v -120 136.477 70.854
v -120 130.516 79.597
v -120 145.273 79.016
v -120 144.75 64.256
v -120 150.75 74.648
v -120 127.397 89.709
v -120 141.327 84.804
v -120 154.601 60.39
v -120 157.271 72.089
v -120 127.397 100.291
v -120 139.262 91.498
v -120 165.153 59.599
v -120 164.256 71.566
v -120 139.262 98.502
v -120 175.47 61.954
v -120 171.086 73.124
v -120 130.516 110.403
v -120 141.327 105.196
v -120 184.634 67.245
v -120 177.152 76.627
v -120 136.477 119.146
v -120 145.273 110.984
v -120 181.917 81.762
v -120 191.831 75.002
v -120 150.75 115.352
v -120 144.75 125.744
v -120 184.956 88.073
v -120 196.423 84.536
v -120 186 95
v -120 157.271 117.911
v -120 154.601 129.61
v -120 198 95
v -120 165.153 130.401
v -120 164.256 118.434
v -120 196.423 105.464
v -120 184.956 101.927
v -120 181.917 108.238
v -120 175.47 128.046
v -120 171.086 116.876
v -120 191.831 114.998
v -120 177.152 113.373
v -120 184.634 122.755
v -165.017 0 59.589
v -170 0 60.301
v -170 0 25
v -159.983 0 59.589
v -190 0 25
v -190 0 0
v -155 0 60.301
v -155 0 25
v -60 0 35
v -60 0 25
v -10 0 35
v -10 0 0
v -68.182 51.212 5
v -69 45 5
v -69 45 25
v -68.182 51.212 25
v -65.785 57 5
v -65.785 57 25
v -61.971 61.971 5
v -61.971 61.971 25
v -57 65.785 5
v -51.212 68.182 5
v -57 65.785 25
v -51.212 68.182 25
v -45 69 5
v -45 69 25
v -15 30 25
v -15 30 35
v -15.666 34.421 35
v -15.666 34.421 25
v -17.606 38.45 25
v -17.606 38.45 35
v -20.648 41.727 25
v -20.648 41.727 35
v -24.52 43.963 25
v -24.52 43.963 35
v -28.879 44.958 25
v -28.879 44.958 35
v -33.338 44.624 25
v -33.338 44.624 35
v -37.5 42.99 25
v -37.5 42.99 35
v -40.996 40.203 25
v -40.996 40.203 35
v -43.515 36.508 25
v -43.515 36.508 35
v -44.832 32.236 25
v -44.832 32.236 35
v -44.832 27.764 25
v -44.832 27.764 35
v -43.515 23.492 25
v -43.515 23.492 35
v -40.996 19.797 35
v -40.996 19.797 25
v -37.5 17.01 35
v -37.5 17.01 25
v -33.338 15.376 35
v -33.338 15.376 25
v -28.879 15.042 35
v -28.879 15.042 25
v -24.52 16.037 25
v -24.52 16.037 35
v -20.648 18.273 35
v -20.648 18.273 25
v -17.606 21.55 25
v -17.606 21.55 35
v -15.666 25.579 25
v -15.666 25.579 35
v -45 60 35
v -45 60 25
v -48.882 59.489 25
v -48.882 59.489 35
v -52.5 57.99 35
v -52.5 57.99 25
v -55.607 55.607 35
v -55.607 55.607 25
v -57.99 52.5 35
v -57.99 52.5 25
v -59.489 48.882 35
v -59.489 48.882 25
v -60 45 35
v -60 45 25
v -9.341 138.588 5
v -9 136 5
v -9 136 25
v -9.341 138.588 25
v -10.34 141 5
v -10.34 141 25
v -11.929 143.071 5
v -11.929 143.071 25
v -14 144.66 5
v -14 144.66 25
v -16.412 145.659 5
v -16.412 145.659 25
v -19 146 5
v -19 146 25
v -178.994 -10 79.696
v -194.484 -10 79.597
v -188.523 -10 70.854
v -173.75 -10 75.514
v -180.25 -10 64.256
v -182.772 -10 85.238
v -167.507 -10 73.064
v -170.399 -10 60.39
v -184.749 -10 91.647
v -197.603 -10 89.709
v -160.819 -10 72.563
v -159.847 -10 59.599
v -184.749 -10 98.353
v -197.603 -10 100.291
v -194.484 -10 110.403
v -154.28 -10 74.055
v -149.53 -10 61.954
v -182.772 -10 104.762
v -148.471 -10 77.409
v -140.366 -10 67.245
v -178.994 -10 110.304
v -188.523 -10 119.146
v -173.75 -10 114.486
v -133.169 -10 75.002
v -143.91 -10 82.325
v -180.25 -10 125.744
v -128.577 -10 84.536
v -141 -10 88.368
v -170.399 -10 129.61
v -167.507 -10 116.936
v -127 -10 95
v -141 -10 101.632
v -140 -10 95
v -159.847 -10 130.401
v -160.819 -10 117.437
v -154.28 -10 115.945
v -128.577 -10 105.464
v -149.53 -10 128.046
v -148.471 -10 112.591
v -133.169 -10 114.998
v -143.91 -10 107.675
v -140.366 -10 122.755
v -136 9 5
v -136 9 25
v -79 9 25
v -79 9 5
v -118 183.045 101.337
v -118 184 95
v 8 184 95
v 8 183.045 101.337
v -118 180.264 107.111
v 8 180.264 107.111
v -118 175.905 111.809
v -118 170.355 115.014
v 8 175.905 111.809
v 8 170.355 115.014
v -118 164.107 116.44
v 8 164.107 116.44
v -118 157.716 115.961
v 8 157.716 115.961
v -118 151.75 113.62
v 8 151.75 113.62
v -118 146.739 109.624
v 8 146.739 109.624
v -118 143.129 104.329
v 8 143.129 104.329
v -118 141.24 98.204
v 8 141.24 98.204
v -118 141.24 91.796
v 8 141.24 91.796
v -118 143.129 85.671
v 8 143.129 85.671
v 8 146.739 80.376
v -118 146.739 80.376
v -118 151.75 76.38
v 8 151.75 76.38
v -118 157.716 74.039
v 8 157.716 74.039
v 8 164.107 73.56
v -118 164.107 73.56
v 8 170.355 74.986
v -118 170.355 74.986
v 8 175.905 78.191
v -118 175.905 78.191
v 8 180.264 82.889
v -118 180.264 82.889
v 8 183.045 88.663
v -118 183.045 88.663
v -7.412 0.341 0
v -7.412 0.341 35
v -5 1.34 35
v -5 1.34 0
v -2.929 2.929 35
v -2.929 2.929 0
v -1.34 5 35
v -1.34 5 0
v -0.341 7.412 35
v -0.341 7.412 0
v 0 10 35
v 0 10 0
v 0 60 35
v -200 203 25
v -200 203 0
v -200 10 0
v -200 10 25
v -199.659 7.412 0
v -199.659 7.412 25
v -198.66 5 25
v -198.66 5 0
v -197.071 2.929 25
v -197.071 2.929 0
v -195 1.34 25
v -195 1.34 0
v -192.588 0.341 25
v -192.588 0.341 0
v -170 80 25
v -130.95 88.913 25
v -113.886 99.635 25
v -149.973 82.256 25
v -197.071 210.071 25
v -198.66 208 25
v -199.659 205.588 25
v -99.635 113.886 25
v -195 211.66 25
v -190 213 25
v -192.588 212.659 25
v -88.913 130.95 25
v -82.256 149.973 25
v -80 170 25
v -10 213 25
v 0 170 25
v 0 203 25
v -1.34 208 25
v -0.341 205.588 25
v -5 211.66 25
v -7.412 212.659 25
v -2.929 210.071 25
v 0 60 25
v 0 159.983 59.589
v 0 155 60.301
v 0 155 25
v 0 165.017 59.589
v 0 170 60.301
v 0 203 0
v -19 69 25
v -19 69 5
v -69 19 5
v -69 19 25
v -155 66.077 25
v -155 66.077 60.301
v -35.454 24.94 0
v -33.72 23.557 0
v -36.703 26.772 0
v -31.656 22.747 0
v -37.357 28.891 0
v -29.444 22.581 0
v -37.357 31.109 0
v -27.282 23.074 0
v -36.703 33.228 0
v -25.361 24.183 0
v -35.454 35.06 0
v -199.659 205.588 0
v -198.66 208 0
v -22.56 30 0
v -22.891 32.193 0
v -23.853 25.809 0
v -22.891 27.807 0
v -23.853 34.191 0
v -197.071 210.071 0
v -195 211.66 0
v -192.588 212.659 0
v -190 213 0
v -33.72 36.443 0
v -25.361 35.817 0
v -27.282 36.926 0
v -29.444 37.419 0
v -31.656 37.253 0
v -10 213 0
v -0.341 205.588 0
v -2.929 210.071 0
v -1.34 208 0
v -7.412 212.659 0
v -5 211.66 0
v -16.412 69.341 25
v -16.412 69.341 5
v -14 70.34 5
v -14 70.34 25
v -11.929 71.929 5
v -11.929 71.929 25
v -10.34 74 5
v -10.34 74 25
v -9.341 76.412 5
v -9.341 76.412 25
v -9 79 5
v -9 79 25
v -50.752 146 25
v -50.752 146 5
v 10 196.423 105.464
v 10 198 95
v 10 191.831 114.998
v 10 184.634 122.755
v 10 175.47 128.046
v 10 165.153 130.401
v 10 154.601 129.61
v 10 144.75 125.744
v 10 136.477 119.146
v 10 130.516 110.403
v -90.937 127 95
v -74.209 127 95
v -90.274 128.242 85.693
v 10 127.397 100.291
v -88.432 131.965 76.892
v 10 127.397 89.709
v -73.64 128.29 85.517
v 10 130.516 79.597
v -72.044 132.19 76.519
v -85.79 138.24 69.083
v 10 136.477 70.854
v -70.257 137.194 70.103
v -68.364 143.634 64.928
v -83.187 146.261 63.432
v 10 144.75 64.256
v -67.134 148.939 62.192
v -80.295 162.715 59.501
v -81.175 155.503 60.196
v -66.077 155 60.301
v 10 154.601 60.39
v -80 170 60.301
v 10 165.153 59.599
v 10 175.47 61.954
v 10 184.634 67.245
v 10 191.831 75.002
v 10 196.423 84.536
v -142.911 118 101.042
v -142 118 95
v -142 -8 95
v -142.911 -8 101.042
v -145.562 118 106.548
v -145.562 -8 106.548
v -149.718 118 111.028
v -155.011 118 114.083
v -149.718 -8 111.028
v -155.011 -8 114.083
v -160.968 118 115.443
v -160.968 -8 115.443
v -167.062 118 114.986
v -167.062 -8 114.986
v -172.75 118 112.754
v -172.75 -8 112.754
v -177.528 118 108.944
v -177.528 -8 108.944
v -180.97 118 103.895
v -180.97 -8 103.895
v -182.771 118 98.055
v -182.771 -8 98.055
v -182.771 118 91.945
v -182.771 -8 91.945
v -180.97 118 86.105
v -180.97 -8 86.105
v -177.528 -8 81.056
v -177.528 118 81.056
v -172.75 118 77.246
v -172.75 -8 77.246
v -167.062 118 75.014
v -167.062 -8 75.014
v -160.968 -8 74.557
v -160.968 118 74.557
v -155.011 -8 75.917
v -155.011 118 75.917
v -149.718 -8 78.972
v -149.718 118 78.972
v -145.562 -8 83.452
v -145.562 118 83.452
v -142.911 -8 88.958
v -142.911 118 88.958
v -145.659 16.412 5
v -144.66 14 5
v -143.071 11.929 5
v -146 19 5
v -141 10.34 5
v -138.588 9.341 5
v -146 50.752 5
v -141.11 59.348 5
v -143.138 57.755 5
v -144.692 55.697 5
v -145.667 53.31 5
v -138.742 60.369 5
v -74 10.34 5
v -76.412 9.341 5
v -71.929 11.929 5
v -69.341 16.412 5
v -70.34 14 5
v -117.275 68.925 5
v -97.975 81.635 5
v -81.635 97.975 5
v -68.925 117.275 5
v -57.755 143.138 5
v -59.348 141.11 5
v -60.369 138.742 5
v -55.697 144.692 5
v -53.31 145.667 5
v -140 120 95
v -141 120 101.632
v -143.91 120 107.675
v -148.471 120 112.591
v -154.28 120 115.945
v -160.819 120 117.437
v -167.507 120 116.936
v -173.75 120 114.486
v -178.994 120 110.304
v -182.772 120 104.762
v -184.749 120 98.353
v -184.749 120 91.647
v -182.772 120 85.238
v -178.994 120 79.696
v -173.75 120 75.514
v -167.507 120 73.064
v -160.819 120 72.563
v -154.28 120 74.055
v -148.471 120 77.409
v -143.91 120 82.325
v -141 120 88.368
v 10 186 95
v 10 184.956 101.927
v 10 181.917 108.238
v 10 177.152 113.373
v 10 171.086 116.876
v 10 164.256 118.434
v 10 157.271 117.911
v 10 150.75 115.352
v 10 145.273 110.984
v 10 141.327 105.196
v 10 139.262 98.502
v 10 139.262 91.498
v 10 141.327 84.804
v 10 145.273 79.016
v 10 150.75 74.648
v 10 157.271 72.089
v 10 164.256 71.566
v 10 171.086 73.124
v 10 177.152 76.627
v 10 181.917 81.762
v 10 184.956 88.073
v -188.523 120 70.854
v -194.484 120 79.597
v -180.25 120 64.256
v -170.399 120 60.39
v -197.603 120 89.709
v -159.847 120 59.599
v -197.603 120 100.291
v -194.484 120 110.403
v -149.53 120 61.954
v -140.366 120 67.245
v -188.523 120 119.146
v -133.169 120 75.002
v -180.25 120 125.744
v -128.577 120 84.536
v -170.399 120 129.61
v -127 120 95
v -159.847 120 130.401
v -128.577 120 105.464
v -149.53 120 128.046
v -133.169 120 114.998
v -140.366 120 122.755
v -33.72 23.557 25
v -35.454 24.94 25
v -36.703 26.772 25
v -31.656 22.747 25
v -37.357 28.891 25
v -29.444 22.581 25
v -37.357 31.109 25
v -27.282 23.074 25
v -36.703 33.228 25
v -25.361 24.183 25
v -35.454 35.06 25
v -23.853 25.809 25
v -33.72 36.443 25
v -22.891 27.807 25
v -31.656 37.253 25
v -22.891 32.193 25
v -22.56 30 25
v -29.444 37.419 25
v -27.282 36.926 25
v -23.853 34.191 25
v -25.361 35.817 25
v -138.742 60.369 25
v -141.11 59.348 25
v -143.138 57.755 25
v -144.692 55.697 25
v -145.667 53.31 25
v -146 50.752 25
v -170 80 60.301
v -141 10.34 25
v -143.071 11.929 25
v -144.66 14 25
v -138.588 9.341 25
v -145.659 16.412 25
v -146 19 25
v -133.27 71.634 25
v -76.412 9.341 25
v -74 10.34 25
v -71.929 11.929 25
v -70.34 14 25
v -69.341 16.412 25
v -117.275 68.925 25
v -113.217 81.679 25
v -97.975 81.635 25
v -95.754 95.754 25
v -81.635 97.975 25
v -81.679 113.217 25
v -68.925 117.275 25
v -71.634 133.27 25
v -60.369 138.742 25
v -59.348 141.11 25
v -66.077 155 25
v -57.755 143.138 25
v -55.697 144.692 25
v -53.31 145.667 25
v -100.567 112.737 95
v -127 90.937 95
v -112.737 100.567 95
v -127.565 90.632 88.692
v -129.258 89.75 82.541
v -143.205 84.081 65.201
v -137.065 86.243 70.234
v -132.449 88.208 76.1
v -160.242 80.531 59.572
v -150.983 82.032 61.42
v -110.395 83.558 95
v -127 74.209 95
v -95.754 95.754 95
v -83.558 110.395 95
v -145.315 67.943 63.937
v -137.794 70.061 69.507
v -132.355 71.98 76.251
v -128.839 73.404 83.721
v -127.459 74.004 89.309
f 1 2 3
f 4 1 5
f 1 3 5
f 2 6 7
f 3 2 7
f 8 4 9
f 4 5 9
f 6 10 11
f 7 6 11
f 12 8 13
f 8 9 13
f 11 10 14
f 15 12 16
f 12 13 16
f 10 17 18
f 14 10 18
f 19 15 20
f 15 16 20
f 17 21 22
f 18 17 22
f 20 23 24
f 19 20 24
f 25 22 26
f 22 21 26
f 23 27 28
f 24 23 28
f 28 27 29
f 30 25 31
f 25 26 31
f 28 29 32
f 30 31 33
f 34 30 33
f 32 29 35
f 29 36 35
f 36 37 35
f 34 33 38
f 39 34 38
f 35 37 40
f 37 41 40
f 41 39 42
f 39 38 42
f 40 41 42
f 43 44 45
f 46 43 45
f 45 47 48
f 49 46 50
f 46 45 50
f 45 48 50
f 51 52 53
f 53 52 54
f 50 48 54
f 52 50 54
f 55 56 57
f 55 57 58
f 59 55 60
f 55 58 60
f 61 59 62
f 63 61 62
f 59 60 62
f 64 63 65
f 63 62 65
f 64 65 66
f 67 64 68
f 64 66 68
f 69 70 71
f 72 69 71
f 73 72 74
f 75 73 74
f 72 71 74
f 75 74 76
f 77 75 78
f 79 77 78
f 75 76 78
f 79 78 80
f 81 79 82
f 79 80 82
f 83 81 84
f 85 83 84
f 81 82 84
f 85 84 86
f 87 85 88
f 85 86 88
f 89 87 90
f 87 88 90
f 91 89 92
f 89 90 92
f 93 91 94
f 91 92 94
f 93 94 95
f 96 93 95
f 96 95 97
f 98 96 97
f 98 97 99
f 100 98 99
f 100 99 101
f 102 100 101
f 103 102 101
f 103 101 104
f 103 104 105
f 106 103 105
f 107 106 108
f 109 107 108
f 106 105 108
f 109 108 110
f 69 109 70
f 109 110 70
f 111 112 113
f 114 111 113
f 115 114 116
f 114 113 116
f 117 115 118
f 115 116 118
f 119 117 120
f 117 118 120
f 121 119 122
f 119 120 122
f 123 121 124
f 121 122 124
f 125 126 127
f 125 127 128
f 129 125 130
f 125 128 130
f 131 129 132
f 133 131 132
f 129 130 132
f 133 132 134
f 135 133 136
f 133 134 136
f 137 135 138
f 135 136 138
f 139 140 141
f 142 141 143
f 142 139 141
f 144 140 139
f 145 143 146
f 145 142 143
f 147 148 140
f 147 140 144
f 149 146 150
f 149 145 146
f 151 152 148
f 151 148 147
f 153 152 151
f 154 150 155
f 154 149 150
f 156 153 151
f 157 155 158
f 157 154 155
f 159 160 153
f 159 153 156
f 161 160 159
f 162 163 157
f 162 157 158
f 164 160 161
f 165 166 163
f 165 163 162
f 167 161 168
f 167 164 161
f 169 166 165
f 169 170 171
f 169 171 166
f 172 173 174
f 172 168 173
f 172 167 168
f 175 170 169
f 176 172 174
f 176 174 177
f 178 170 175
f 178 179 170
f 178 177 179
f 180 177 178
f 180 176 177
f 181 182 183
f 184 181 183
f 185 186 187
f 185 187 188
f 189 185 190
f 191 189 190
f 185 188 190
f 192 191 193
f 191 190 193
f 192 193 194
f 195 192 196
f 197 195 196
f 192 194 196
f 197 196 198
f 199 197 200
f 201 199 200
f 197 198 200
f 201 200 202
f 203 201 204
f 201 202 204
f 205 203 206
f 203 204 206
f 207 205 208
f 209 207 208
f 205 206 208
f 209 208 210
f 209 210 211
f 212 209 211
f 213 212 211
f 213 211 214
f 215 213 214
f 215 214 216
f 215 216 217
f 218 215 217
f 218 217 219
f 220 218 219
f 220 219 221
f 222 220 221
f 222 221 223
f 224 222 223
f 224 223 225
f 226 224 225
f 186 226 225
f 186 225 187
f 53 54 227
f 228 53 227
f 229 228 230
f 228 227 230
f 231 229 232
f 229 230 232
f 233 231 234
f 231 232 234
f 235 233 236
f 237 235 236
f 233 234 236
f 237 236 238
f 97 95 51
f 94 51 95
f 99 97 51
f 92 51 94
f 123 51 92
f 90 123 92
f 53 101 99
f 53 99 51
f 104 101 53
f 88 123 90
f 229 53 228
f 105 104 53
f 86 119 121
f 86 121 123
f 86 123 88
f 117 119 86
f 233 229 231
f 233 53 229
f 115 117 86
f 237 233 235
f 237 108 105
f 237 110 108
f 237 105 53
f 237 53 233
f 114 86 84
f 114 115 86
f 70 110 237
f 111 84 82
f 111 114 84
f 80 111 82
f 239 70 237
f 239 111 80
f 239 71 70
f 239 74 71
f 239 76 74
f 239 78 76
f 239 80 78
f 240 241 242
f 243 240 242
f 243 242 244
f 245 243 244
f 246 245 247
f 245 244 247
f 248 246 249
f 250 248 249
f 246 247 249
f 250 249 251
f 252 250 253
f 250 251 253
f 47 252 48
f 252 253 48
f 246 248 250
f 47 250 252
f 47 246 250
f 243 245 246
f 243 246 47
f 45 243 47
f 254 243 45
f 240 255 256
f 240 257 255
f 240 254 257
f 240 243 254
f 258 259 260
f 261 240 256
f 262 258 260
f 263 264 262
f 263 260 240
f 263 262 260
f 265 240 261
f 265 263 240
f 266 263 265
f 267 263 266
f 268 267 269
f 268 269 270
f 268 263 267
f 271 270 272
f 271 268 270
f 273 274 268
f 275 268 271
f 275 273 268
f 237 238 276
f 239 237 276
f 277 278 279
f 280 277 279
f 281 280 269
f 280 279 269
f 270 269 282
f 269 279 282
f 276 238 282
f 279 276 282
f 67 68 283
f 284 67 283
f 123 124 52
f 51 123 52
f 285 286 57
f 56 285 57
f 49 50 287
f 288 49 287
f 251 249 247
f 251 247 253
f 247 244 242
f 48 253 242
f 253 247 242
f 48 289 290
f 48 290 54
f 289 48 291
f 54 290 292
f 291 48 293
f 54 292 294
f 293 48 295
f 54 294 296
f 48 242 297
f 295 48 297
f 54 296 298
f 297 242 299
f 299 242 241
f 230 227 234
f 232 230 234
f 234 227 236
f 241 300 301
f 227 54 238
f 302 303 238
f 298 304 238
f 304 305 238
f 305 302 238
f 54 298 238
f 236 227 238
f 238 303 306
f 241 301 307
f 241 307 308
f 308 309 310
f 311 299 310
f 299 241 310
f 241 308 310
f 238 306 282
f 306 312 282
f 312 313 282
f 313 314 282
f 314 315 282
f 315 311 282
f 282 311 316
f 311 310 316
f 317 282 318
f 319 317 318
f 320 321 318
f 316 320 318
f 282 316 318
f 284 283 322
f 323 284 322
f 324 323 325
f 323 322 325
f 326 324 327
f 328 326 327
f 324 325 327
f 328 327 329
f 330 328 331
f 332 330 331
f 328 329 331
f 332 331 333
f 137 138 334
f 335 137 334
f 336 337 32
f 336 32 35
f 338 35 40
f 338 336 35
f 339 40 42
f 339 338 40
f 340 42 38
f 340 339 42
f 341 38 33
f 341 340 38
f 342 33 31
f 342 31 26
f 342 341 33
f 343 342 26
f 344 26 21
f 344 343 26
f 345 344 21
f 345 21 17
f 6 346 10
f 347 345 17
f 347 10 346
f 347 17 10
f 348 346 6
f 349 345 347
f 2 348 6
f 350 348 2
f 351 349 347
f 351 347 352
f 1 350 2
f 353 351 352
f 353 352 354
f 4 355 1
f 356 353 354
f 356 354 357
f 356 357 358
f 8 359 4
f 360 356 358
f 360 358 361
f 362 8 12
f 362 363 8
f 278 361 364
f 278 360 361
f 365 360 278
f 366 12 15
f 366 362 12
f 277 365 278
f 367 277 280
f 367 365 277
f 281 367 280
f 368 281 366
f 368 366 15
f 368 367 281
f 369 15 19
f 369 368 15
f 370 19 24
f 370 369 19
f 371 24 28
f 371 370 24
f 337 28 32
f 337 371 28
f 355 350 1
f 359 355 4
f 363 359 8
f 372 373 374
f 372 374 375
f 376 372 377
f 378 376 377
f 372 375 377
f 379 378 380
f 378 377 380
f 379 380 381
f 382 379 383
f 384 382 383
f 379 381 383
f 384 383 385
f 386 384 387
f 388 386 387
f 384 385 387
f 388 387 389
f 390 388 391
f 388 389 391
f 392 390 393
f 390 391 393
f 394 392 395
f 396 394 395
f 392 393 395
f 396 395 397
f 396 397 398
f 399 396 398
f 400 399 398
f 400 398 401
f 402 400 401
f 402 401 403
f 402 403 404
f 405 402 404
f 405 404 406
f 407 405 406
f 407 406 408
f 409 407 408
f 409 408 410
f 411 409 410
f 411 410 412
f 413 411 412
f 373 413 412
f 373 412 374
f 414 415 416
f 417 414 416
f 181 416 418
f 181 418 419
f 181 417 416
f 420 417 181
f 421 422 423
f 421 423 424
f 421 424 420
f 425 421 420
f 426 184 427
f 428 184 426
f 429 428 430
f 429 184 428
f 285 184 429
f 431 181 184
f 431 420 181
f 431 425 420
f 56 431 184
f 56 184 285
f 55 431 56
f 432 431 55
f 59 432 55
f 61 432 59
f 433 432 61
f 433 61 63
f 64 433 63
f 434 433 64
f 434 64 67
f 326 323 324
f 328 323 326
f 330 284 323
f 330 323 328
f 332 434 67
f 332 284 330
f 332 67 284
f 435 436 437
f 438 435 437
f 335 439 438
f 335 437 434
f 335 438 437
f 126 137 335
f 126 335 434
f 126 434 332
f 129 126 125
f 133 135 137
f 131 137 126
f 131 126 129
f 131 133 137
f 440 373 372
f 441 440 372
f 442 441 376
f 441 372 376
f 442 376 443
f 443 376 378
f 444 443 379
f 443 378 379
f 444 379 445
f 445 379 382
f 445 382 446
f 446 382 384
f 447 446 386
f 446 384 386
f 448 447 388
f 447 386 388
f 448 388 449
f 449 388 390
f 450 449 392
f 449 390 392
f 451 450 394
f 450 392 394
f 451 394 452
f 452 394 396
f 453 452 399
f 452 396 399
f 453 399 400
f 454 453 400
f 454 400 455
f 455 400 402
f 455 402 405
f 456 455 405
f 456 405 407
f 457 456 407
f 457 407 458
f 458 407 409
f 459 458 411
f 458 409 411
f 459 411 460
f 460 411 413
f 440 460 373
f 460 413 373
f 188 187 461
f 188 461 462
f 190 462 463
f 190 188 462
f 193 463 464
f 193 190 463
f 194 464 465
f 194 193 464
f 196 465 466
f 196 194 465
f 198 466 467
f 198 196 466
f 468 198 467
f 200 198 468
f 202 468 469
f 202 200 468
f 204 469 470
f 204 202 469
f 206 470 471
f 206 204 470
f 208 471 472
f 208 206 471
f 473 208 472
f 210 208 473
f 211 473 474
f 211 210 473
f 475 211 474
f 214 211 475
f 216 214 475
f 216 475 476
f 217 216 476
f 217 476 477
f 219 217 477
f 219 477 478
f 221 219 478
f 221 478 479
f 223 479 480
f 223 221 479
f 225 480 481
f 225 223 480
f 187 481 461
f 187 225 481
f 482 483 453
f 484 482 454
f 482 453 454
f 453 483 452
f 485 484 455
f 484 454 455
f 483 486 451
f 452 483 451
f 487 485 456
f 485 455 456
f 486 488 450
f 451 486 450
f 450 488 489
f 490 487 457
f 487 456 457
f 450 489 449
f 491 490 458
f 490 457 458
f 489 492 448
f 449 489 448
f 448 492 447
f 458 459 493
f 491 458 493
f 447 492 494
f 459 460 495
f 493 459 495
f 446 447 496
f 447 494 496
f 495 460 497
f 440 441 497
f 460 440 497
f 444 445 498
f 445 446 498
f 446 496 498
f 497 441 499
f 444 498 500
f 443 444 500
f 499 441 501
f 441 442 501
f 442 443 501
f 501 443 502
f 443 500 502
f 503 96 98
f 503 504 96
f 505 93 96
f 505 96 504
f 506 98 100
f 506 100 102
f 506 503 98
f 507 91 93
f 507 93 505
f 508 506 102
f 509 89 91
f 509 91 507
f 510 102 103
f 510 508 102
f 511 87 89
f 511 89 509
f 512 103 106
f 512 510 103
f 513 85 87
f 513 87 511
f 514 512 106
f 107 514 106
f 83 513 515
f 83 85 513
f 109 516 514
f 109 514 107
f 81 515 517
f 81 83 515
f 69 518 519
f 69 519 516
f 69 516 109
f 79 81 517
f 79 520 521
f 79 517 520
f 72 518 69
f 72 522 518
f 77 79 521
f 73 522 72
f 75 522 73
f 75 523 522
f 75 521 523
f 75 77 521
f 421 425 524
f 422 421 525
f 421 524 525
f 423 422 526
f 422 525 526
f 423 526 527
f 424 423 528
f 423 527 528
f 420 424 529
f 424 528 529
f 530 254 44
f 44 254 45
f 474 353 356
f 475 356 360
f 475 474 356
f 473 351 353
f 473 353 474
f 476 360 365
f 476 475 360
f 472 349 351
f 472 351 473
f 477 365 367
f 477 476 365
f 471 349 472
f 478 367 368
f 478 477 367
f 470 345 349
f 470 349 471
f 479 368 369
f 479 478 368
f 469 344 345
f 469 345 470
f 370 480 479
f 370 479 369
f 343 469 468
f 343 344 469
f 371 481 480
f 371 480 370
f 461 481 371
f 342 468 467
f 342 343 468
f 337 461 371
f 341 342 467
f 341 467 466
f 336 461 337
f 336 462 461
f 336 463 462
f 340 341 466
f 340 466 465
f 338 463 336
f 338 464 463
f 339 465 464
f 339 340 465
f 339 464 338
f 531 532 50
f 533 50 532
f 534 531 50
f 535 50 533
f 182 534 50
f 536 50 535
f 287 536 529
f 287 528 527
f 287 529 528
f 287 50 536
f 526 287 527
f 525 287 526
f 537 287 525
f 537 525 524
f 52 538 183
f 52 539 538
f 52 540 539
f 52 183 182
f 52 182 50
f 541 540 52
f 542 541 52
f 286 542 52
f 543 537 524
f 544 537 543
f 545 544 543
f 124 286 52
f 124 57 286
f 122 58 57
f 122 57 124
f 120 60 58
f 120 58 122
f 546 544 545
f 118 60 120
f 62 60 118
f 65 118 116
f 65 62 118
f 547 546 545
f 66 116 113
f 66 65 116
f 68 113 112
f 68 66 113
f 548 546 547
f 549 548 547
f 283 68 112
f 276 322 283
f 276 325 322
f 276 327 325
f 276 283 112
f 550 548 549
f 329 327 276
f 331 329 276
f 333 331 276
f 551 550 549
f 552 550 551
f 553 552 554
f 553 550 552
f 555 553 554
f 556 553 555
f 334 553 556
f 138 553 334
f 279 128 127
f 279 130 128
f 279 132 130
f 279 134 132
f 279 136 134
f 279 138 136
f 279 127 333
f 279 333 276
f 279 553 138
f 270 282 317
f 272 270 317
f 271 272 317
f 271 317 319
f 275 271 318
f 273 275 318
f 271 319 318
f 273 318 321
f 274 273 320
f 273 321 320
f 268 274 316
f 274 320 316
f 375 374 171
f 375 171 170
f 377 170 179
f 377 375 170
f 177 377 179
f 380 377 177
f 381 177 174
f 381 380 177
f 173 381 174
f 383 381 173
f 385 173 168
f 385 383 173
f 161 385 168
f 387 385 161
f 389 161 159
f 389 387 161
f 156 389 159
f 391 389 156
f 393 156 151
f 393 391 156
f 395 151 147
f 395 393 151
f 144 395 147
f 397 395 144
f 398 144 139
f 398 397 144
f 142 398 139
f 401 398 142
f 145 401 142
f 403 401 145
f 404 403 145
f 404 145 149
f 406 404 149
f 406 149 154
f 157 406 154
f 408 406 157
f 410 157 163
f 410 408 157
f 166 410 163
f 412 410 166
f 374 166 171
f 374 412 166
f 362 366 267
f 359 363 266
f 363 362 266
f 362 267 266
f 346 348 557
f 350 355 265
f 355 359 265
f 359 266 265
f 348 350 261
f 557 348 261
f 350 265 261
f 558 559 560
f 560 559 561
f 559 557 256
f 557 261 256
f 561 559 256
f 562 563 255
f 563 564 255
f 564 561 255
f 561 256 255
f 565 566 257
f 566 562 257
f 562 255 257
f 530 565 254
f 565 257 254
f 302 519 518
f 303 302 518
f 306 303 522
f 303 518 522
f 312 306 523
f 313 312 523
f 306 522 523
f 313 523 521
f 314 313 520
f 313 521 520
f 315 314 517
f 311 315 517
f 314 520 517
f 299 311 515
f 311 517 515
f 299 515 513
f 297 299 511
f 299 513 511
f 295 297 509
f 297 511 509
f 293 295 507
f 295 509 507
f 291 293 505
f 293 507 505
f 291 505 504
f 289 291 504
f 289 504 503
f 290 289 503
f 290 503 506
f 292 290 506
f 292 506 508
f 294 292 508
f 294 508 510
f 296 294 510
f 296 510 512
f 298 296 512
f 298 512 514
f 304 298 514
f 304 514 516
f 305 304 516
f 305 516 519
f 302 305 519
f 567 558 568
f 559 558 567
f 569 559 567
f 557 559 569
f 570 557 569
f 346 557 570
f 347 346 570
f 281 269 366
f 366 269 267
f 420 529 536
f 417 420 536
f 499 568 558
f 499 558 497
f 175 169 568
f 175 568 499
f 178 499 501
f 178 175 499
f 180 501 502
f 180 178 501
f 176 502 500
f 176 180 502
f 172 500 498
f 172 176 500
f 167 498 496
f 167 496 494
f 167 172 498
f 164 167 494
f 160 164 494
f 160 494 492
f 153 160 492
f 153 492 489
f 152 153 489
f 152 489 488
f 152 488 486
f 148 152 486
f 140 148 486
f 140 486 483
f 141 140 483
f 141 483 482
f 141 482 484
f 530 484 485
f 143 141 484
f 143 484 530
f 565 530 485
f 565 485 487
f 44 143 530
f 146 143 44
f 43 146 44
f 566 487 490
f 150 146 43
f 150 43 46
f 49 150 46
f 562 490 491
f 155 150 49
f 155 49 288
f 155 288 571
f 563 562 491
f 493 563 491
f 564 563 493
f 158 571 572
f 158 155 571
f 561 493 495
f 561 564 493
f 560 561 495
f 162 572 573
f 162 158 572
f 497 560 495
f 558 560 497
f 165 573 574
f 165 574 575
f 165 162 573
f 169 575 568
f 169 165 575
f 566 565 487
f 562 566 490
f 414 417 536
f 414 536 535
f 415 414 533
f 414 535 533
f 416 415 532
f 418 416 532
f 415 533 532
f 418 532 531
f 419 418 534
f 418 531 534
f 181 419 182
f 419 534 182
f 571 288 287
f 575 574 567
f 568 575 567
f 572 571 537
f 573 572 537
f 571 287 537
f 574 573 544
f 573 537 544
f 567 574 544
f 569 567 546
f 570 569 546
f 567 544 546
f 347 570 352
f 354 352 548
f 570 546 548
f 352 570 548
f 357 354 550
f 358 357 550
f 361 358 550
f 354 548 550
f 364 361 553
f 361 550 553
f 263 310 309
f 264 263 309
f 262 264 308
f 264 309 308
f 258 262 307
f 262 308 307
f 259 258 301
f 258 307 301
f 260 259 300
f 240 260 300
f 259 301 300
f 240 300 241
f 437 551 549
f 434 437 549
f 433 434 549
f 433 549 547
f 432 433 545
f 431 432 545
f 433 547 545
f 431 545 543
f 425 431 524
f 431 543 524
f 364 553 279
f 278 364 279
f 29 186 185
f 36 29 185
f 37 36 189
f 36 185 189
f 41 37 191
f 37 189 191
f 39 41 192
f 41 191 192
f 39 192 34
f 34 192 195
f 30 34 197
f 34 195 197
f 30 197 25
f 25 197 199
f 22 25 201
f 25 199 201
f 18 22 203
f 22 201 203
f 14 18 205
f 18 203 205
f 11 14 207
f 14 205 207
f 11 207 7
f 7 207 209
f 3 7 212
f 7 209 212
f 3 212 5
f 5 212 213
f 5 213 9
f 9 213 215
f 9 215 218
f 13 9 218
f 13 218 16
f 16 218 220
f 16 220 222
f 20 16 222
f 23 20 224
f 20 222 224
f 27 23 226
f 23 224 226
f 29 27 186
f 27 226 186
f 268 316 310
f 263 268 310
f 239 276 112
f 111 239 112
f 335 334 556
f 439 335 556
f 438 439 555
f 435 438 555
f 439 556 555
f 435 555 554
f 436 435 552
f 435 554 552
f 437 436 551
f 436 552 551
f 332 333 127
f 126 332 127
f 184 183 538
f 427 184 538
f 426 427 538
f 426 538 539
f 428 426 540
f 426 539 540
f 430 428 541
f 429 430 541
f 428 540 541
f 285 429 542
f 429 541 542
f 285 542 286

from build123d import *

# Parameters (mm, degrees)
F1_DEPTH  = 25
F3_DEPTH  = 70
F5_DEPTH  = 10
F6_R      = 15
F7_DEPTH  = 10
F8_R      = 7.44
F9_DEPTH  = 25.001
F11_DEPTH = 20
F13_R     = 35.5
F14_DEPTH = 130
F15_R     = 20.5
F16_DEPTH = 223.001
F18_R     = 35.5
F19_DEPTH = 130
F20_R     = 21.5
F21_DEPTH = 210.001
F22_SIZE2 = 2
F22_SIZE  = 2


with BuildPart() as f1:
    # F0 (on Top) → F1 (new body)
    with BuildSketch(Plane.XY):
        with BuildLine():
            Line((-190, 0), (-10, 0))
            ThreePointArc((-10, 0), (-2.9289321881, 2.9289321881), (0, 10))
            Line((0, 10), (0, 203))
            ThreePointArc((0, 203), (-2.9289321881, 210.0710678119), (-10, 213))
            Line((-10, 213), (-190, 213))
            ThreePointArc((-190, 213), (-197.0710678119, 210.0710678119), (-200, 203))
            Line((-200, 203), (-200, 10))
            ThreePointArc((-200, 10), (-197.0710678119, 2.9289321881), (-190, 0))
        make_face()
    extrude(amount=F1_DEPTH)

    # F2 (on face) → F3 (join)
    with BuildSketch(Plane.XY.offset(25)):
        with BuildLine():
            Line((0, 155), (0, 170))
            Line((0, 170), (-80, 170))
            ThreePointArc((-80, 170), (-106.3603896932, 106.3603896932), (-170, 80))
            Line((-170, 80), (-170, 0))
            Line((-170, 0), (-155, 0))
            Line((-155, 0), (-155, 66.0769515459))
            ThreePointArc((-155, 66.0769515459), (-95.7537879754, 95.7537879754), (-66.0769515459, 155))
            Line((-66.0769515459, 155), (0, 155))
        make_face()
    extrude(amount=F3_DEPTH)

    # F4 (on face) → F5 (join)
    with BuildSketch(Plane.XY.offset(25)):
        with BuildLine():
            Line((0, 60), (-45, 60))
            ThreePointArc((-45, 60), (-55.6066017178, 55.6066017178), (-60, 45))
            Line((-60, 45), (-60, 0))
            Line((-60, 0), (-10, 0))
            ThreePointArc((-10, 0), (-2.9289321881, 2.9289321881), (0, 10))
            Line((0, 10), (0, 60))
        make_face()
    extrude(amount=F5_DEPTH)

    # F6 (on face) → F7 (cut)
    with BuildSketch(Plane.XY.offset(35)):
        with Locations((-30, 30)):
            Circle(F6_R)
    extrude(amount=-F7_DEPTH, mode=Mode.SUBTRACT)

    # F8 (on face) → F9 (cut, through all)
    with BuildSketch(Plane.XY.offset(25)):
        with Locations((-30, 30)):
            Circle(F8_R)
    extrude(amount=-F9_DEPTH, mode=Mode.SUBTRACT)

    # F10 (on face) → F11 (cut)
    with BuildSketch(Plane.XY.offset(25)):
        with BuildLine():
            ThreePointArc((-19, 69), (-11.9289321881, 71.9289321881), (-9, 79))
            Line((-9, 79), (-9, 136))
            ThreePointArc((-9, 136), (-11.9289321881, 143.0710678119), (-19, 146))
            Line((-19, 146), (-50.7523585139, 146))
            ThreePointArc((-50.7523585139, 146), (-56.7765034807, 143.981834214), (-60.369103795, 138.7419354839))
            ThreePointArc((-60.369103795, 138.7419354839), (-89.3898269447, 89.3898269447), (-138.7419354839, 60.369103795))
            ThreePointArc((-138.7419354839, 60.369103795), (-143.981834214, 56.7765034807), (-146, 50.7523585139))
            Line((-146, 50.7523585139), (-146, 19))
            ThreePointArc((-146, 19), (-143.0710678119, 11.9289321881), (-136, 9))
            Line((-136, 9), (-79, 9))
            ThreePointArc((-79, 9), (-71.9289321881, 11.9289321881), (-69, 19))
            Line((-69, 19), (-69, 45))
            ThreePointArc((-69, 45), (-61.9705627485, 61.9705627485), (-45, 69))
            Line((-45, 69), (-19, 69))
        make_face()
    extrude(amount=-F11_DEPTH, mode=Mode.SUBTRACT)

    # F13 (on offset) → F14 (join)
    with BuildSketch(Plane.XZ.offset(10)):
        with Locations((-162.5, 95)):
            Circle(F13_R)
    extrude(amount=-F14_DEPTH)

    # F15 (on face) → F16 (cut, through all)
    with BuildSketch(Plane.XZ.offset(10)):
        with Locations((-162.5, 95)):
            Circle(F15_R)
    extrude(amount=-F16_DEPTH, mode=Mode.SUBTRACT)

    # F18 (on offset) → F19 (join)
    with BuildSketch(Plane.YZ.offset(10)):
        with Locations((162.5, 95)):
            Circle(F18_R)
    extrude(amount=-F19_DEPTH)

    # F20 (on face) → F21 (cut, through all)
    with BuildSketch(Plane.YZ.offset(10)):
        with Locations((162.5, 95)):
            Circle(F20_R)
    extrude(amount=-F21_DEPTH, mode=Mode.SUBTRACT)

    # F22
    f22_edges = [f1.edges().sort_by_distance(p)[0] for p in [
        (-183, -10, 95),
        (-183, 120, 95),
        (10, 141, 95),
        (-120, 141, 95),
    ]]
    chamfer(f22_edges, length=F22_SIZE, length2=F22_SIZE2)


solid = f1.part
